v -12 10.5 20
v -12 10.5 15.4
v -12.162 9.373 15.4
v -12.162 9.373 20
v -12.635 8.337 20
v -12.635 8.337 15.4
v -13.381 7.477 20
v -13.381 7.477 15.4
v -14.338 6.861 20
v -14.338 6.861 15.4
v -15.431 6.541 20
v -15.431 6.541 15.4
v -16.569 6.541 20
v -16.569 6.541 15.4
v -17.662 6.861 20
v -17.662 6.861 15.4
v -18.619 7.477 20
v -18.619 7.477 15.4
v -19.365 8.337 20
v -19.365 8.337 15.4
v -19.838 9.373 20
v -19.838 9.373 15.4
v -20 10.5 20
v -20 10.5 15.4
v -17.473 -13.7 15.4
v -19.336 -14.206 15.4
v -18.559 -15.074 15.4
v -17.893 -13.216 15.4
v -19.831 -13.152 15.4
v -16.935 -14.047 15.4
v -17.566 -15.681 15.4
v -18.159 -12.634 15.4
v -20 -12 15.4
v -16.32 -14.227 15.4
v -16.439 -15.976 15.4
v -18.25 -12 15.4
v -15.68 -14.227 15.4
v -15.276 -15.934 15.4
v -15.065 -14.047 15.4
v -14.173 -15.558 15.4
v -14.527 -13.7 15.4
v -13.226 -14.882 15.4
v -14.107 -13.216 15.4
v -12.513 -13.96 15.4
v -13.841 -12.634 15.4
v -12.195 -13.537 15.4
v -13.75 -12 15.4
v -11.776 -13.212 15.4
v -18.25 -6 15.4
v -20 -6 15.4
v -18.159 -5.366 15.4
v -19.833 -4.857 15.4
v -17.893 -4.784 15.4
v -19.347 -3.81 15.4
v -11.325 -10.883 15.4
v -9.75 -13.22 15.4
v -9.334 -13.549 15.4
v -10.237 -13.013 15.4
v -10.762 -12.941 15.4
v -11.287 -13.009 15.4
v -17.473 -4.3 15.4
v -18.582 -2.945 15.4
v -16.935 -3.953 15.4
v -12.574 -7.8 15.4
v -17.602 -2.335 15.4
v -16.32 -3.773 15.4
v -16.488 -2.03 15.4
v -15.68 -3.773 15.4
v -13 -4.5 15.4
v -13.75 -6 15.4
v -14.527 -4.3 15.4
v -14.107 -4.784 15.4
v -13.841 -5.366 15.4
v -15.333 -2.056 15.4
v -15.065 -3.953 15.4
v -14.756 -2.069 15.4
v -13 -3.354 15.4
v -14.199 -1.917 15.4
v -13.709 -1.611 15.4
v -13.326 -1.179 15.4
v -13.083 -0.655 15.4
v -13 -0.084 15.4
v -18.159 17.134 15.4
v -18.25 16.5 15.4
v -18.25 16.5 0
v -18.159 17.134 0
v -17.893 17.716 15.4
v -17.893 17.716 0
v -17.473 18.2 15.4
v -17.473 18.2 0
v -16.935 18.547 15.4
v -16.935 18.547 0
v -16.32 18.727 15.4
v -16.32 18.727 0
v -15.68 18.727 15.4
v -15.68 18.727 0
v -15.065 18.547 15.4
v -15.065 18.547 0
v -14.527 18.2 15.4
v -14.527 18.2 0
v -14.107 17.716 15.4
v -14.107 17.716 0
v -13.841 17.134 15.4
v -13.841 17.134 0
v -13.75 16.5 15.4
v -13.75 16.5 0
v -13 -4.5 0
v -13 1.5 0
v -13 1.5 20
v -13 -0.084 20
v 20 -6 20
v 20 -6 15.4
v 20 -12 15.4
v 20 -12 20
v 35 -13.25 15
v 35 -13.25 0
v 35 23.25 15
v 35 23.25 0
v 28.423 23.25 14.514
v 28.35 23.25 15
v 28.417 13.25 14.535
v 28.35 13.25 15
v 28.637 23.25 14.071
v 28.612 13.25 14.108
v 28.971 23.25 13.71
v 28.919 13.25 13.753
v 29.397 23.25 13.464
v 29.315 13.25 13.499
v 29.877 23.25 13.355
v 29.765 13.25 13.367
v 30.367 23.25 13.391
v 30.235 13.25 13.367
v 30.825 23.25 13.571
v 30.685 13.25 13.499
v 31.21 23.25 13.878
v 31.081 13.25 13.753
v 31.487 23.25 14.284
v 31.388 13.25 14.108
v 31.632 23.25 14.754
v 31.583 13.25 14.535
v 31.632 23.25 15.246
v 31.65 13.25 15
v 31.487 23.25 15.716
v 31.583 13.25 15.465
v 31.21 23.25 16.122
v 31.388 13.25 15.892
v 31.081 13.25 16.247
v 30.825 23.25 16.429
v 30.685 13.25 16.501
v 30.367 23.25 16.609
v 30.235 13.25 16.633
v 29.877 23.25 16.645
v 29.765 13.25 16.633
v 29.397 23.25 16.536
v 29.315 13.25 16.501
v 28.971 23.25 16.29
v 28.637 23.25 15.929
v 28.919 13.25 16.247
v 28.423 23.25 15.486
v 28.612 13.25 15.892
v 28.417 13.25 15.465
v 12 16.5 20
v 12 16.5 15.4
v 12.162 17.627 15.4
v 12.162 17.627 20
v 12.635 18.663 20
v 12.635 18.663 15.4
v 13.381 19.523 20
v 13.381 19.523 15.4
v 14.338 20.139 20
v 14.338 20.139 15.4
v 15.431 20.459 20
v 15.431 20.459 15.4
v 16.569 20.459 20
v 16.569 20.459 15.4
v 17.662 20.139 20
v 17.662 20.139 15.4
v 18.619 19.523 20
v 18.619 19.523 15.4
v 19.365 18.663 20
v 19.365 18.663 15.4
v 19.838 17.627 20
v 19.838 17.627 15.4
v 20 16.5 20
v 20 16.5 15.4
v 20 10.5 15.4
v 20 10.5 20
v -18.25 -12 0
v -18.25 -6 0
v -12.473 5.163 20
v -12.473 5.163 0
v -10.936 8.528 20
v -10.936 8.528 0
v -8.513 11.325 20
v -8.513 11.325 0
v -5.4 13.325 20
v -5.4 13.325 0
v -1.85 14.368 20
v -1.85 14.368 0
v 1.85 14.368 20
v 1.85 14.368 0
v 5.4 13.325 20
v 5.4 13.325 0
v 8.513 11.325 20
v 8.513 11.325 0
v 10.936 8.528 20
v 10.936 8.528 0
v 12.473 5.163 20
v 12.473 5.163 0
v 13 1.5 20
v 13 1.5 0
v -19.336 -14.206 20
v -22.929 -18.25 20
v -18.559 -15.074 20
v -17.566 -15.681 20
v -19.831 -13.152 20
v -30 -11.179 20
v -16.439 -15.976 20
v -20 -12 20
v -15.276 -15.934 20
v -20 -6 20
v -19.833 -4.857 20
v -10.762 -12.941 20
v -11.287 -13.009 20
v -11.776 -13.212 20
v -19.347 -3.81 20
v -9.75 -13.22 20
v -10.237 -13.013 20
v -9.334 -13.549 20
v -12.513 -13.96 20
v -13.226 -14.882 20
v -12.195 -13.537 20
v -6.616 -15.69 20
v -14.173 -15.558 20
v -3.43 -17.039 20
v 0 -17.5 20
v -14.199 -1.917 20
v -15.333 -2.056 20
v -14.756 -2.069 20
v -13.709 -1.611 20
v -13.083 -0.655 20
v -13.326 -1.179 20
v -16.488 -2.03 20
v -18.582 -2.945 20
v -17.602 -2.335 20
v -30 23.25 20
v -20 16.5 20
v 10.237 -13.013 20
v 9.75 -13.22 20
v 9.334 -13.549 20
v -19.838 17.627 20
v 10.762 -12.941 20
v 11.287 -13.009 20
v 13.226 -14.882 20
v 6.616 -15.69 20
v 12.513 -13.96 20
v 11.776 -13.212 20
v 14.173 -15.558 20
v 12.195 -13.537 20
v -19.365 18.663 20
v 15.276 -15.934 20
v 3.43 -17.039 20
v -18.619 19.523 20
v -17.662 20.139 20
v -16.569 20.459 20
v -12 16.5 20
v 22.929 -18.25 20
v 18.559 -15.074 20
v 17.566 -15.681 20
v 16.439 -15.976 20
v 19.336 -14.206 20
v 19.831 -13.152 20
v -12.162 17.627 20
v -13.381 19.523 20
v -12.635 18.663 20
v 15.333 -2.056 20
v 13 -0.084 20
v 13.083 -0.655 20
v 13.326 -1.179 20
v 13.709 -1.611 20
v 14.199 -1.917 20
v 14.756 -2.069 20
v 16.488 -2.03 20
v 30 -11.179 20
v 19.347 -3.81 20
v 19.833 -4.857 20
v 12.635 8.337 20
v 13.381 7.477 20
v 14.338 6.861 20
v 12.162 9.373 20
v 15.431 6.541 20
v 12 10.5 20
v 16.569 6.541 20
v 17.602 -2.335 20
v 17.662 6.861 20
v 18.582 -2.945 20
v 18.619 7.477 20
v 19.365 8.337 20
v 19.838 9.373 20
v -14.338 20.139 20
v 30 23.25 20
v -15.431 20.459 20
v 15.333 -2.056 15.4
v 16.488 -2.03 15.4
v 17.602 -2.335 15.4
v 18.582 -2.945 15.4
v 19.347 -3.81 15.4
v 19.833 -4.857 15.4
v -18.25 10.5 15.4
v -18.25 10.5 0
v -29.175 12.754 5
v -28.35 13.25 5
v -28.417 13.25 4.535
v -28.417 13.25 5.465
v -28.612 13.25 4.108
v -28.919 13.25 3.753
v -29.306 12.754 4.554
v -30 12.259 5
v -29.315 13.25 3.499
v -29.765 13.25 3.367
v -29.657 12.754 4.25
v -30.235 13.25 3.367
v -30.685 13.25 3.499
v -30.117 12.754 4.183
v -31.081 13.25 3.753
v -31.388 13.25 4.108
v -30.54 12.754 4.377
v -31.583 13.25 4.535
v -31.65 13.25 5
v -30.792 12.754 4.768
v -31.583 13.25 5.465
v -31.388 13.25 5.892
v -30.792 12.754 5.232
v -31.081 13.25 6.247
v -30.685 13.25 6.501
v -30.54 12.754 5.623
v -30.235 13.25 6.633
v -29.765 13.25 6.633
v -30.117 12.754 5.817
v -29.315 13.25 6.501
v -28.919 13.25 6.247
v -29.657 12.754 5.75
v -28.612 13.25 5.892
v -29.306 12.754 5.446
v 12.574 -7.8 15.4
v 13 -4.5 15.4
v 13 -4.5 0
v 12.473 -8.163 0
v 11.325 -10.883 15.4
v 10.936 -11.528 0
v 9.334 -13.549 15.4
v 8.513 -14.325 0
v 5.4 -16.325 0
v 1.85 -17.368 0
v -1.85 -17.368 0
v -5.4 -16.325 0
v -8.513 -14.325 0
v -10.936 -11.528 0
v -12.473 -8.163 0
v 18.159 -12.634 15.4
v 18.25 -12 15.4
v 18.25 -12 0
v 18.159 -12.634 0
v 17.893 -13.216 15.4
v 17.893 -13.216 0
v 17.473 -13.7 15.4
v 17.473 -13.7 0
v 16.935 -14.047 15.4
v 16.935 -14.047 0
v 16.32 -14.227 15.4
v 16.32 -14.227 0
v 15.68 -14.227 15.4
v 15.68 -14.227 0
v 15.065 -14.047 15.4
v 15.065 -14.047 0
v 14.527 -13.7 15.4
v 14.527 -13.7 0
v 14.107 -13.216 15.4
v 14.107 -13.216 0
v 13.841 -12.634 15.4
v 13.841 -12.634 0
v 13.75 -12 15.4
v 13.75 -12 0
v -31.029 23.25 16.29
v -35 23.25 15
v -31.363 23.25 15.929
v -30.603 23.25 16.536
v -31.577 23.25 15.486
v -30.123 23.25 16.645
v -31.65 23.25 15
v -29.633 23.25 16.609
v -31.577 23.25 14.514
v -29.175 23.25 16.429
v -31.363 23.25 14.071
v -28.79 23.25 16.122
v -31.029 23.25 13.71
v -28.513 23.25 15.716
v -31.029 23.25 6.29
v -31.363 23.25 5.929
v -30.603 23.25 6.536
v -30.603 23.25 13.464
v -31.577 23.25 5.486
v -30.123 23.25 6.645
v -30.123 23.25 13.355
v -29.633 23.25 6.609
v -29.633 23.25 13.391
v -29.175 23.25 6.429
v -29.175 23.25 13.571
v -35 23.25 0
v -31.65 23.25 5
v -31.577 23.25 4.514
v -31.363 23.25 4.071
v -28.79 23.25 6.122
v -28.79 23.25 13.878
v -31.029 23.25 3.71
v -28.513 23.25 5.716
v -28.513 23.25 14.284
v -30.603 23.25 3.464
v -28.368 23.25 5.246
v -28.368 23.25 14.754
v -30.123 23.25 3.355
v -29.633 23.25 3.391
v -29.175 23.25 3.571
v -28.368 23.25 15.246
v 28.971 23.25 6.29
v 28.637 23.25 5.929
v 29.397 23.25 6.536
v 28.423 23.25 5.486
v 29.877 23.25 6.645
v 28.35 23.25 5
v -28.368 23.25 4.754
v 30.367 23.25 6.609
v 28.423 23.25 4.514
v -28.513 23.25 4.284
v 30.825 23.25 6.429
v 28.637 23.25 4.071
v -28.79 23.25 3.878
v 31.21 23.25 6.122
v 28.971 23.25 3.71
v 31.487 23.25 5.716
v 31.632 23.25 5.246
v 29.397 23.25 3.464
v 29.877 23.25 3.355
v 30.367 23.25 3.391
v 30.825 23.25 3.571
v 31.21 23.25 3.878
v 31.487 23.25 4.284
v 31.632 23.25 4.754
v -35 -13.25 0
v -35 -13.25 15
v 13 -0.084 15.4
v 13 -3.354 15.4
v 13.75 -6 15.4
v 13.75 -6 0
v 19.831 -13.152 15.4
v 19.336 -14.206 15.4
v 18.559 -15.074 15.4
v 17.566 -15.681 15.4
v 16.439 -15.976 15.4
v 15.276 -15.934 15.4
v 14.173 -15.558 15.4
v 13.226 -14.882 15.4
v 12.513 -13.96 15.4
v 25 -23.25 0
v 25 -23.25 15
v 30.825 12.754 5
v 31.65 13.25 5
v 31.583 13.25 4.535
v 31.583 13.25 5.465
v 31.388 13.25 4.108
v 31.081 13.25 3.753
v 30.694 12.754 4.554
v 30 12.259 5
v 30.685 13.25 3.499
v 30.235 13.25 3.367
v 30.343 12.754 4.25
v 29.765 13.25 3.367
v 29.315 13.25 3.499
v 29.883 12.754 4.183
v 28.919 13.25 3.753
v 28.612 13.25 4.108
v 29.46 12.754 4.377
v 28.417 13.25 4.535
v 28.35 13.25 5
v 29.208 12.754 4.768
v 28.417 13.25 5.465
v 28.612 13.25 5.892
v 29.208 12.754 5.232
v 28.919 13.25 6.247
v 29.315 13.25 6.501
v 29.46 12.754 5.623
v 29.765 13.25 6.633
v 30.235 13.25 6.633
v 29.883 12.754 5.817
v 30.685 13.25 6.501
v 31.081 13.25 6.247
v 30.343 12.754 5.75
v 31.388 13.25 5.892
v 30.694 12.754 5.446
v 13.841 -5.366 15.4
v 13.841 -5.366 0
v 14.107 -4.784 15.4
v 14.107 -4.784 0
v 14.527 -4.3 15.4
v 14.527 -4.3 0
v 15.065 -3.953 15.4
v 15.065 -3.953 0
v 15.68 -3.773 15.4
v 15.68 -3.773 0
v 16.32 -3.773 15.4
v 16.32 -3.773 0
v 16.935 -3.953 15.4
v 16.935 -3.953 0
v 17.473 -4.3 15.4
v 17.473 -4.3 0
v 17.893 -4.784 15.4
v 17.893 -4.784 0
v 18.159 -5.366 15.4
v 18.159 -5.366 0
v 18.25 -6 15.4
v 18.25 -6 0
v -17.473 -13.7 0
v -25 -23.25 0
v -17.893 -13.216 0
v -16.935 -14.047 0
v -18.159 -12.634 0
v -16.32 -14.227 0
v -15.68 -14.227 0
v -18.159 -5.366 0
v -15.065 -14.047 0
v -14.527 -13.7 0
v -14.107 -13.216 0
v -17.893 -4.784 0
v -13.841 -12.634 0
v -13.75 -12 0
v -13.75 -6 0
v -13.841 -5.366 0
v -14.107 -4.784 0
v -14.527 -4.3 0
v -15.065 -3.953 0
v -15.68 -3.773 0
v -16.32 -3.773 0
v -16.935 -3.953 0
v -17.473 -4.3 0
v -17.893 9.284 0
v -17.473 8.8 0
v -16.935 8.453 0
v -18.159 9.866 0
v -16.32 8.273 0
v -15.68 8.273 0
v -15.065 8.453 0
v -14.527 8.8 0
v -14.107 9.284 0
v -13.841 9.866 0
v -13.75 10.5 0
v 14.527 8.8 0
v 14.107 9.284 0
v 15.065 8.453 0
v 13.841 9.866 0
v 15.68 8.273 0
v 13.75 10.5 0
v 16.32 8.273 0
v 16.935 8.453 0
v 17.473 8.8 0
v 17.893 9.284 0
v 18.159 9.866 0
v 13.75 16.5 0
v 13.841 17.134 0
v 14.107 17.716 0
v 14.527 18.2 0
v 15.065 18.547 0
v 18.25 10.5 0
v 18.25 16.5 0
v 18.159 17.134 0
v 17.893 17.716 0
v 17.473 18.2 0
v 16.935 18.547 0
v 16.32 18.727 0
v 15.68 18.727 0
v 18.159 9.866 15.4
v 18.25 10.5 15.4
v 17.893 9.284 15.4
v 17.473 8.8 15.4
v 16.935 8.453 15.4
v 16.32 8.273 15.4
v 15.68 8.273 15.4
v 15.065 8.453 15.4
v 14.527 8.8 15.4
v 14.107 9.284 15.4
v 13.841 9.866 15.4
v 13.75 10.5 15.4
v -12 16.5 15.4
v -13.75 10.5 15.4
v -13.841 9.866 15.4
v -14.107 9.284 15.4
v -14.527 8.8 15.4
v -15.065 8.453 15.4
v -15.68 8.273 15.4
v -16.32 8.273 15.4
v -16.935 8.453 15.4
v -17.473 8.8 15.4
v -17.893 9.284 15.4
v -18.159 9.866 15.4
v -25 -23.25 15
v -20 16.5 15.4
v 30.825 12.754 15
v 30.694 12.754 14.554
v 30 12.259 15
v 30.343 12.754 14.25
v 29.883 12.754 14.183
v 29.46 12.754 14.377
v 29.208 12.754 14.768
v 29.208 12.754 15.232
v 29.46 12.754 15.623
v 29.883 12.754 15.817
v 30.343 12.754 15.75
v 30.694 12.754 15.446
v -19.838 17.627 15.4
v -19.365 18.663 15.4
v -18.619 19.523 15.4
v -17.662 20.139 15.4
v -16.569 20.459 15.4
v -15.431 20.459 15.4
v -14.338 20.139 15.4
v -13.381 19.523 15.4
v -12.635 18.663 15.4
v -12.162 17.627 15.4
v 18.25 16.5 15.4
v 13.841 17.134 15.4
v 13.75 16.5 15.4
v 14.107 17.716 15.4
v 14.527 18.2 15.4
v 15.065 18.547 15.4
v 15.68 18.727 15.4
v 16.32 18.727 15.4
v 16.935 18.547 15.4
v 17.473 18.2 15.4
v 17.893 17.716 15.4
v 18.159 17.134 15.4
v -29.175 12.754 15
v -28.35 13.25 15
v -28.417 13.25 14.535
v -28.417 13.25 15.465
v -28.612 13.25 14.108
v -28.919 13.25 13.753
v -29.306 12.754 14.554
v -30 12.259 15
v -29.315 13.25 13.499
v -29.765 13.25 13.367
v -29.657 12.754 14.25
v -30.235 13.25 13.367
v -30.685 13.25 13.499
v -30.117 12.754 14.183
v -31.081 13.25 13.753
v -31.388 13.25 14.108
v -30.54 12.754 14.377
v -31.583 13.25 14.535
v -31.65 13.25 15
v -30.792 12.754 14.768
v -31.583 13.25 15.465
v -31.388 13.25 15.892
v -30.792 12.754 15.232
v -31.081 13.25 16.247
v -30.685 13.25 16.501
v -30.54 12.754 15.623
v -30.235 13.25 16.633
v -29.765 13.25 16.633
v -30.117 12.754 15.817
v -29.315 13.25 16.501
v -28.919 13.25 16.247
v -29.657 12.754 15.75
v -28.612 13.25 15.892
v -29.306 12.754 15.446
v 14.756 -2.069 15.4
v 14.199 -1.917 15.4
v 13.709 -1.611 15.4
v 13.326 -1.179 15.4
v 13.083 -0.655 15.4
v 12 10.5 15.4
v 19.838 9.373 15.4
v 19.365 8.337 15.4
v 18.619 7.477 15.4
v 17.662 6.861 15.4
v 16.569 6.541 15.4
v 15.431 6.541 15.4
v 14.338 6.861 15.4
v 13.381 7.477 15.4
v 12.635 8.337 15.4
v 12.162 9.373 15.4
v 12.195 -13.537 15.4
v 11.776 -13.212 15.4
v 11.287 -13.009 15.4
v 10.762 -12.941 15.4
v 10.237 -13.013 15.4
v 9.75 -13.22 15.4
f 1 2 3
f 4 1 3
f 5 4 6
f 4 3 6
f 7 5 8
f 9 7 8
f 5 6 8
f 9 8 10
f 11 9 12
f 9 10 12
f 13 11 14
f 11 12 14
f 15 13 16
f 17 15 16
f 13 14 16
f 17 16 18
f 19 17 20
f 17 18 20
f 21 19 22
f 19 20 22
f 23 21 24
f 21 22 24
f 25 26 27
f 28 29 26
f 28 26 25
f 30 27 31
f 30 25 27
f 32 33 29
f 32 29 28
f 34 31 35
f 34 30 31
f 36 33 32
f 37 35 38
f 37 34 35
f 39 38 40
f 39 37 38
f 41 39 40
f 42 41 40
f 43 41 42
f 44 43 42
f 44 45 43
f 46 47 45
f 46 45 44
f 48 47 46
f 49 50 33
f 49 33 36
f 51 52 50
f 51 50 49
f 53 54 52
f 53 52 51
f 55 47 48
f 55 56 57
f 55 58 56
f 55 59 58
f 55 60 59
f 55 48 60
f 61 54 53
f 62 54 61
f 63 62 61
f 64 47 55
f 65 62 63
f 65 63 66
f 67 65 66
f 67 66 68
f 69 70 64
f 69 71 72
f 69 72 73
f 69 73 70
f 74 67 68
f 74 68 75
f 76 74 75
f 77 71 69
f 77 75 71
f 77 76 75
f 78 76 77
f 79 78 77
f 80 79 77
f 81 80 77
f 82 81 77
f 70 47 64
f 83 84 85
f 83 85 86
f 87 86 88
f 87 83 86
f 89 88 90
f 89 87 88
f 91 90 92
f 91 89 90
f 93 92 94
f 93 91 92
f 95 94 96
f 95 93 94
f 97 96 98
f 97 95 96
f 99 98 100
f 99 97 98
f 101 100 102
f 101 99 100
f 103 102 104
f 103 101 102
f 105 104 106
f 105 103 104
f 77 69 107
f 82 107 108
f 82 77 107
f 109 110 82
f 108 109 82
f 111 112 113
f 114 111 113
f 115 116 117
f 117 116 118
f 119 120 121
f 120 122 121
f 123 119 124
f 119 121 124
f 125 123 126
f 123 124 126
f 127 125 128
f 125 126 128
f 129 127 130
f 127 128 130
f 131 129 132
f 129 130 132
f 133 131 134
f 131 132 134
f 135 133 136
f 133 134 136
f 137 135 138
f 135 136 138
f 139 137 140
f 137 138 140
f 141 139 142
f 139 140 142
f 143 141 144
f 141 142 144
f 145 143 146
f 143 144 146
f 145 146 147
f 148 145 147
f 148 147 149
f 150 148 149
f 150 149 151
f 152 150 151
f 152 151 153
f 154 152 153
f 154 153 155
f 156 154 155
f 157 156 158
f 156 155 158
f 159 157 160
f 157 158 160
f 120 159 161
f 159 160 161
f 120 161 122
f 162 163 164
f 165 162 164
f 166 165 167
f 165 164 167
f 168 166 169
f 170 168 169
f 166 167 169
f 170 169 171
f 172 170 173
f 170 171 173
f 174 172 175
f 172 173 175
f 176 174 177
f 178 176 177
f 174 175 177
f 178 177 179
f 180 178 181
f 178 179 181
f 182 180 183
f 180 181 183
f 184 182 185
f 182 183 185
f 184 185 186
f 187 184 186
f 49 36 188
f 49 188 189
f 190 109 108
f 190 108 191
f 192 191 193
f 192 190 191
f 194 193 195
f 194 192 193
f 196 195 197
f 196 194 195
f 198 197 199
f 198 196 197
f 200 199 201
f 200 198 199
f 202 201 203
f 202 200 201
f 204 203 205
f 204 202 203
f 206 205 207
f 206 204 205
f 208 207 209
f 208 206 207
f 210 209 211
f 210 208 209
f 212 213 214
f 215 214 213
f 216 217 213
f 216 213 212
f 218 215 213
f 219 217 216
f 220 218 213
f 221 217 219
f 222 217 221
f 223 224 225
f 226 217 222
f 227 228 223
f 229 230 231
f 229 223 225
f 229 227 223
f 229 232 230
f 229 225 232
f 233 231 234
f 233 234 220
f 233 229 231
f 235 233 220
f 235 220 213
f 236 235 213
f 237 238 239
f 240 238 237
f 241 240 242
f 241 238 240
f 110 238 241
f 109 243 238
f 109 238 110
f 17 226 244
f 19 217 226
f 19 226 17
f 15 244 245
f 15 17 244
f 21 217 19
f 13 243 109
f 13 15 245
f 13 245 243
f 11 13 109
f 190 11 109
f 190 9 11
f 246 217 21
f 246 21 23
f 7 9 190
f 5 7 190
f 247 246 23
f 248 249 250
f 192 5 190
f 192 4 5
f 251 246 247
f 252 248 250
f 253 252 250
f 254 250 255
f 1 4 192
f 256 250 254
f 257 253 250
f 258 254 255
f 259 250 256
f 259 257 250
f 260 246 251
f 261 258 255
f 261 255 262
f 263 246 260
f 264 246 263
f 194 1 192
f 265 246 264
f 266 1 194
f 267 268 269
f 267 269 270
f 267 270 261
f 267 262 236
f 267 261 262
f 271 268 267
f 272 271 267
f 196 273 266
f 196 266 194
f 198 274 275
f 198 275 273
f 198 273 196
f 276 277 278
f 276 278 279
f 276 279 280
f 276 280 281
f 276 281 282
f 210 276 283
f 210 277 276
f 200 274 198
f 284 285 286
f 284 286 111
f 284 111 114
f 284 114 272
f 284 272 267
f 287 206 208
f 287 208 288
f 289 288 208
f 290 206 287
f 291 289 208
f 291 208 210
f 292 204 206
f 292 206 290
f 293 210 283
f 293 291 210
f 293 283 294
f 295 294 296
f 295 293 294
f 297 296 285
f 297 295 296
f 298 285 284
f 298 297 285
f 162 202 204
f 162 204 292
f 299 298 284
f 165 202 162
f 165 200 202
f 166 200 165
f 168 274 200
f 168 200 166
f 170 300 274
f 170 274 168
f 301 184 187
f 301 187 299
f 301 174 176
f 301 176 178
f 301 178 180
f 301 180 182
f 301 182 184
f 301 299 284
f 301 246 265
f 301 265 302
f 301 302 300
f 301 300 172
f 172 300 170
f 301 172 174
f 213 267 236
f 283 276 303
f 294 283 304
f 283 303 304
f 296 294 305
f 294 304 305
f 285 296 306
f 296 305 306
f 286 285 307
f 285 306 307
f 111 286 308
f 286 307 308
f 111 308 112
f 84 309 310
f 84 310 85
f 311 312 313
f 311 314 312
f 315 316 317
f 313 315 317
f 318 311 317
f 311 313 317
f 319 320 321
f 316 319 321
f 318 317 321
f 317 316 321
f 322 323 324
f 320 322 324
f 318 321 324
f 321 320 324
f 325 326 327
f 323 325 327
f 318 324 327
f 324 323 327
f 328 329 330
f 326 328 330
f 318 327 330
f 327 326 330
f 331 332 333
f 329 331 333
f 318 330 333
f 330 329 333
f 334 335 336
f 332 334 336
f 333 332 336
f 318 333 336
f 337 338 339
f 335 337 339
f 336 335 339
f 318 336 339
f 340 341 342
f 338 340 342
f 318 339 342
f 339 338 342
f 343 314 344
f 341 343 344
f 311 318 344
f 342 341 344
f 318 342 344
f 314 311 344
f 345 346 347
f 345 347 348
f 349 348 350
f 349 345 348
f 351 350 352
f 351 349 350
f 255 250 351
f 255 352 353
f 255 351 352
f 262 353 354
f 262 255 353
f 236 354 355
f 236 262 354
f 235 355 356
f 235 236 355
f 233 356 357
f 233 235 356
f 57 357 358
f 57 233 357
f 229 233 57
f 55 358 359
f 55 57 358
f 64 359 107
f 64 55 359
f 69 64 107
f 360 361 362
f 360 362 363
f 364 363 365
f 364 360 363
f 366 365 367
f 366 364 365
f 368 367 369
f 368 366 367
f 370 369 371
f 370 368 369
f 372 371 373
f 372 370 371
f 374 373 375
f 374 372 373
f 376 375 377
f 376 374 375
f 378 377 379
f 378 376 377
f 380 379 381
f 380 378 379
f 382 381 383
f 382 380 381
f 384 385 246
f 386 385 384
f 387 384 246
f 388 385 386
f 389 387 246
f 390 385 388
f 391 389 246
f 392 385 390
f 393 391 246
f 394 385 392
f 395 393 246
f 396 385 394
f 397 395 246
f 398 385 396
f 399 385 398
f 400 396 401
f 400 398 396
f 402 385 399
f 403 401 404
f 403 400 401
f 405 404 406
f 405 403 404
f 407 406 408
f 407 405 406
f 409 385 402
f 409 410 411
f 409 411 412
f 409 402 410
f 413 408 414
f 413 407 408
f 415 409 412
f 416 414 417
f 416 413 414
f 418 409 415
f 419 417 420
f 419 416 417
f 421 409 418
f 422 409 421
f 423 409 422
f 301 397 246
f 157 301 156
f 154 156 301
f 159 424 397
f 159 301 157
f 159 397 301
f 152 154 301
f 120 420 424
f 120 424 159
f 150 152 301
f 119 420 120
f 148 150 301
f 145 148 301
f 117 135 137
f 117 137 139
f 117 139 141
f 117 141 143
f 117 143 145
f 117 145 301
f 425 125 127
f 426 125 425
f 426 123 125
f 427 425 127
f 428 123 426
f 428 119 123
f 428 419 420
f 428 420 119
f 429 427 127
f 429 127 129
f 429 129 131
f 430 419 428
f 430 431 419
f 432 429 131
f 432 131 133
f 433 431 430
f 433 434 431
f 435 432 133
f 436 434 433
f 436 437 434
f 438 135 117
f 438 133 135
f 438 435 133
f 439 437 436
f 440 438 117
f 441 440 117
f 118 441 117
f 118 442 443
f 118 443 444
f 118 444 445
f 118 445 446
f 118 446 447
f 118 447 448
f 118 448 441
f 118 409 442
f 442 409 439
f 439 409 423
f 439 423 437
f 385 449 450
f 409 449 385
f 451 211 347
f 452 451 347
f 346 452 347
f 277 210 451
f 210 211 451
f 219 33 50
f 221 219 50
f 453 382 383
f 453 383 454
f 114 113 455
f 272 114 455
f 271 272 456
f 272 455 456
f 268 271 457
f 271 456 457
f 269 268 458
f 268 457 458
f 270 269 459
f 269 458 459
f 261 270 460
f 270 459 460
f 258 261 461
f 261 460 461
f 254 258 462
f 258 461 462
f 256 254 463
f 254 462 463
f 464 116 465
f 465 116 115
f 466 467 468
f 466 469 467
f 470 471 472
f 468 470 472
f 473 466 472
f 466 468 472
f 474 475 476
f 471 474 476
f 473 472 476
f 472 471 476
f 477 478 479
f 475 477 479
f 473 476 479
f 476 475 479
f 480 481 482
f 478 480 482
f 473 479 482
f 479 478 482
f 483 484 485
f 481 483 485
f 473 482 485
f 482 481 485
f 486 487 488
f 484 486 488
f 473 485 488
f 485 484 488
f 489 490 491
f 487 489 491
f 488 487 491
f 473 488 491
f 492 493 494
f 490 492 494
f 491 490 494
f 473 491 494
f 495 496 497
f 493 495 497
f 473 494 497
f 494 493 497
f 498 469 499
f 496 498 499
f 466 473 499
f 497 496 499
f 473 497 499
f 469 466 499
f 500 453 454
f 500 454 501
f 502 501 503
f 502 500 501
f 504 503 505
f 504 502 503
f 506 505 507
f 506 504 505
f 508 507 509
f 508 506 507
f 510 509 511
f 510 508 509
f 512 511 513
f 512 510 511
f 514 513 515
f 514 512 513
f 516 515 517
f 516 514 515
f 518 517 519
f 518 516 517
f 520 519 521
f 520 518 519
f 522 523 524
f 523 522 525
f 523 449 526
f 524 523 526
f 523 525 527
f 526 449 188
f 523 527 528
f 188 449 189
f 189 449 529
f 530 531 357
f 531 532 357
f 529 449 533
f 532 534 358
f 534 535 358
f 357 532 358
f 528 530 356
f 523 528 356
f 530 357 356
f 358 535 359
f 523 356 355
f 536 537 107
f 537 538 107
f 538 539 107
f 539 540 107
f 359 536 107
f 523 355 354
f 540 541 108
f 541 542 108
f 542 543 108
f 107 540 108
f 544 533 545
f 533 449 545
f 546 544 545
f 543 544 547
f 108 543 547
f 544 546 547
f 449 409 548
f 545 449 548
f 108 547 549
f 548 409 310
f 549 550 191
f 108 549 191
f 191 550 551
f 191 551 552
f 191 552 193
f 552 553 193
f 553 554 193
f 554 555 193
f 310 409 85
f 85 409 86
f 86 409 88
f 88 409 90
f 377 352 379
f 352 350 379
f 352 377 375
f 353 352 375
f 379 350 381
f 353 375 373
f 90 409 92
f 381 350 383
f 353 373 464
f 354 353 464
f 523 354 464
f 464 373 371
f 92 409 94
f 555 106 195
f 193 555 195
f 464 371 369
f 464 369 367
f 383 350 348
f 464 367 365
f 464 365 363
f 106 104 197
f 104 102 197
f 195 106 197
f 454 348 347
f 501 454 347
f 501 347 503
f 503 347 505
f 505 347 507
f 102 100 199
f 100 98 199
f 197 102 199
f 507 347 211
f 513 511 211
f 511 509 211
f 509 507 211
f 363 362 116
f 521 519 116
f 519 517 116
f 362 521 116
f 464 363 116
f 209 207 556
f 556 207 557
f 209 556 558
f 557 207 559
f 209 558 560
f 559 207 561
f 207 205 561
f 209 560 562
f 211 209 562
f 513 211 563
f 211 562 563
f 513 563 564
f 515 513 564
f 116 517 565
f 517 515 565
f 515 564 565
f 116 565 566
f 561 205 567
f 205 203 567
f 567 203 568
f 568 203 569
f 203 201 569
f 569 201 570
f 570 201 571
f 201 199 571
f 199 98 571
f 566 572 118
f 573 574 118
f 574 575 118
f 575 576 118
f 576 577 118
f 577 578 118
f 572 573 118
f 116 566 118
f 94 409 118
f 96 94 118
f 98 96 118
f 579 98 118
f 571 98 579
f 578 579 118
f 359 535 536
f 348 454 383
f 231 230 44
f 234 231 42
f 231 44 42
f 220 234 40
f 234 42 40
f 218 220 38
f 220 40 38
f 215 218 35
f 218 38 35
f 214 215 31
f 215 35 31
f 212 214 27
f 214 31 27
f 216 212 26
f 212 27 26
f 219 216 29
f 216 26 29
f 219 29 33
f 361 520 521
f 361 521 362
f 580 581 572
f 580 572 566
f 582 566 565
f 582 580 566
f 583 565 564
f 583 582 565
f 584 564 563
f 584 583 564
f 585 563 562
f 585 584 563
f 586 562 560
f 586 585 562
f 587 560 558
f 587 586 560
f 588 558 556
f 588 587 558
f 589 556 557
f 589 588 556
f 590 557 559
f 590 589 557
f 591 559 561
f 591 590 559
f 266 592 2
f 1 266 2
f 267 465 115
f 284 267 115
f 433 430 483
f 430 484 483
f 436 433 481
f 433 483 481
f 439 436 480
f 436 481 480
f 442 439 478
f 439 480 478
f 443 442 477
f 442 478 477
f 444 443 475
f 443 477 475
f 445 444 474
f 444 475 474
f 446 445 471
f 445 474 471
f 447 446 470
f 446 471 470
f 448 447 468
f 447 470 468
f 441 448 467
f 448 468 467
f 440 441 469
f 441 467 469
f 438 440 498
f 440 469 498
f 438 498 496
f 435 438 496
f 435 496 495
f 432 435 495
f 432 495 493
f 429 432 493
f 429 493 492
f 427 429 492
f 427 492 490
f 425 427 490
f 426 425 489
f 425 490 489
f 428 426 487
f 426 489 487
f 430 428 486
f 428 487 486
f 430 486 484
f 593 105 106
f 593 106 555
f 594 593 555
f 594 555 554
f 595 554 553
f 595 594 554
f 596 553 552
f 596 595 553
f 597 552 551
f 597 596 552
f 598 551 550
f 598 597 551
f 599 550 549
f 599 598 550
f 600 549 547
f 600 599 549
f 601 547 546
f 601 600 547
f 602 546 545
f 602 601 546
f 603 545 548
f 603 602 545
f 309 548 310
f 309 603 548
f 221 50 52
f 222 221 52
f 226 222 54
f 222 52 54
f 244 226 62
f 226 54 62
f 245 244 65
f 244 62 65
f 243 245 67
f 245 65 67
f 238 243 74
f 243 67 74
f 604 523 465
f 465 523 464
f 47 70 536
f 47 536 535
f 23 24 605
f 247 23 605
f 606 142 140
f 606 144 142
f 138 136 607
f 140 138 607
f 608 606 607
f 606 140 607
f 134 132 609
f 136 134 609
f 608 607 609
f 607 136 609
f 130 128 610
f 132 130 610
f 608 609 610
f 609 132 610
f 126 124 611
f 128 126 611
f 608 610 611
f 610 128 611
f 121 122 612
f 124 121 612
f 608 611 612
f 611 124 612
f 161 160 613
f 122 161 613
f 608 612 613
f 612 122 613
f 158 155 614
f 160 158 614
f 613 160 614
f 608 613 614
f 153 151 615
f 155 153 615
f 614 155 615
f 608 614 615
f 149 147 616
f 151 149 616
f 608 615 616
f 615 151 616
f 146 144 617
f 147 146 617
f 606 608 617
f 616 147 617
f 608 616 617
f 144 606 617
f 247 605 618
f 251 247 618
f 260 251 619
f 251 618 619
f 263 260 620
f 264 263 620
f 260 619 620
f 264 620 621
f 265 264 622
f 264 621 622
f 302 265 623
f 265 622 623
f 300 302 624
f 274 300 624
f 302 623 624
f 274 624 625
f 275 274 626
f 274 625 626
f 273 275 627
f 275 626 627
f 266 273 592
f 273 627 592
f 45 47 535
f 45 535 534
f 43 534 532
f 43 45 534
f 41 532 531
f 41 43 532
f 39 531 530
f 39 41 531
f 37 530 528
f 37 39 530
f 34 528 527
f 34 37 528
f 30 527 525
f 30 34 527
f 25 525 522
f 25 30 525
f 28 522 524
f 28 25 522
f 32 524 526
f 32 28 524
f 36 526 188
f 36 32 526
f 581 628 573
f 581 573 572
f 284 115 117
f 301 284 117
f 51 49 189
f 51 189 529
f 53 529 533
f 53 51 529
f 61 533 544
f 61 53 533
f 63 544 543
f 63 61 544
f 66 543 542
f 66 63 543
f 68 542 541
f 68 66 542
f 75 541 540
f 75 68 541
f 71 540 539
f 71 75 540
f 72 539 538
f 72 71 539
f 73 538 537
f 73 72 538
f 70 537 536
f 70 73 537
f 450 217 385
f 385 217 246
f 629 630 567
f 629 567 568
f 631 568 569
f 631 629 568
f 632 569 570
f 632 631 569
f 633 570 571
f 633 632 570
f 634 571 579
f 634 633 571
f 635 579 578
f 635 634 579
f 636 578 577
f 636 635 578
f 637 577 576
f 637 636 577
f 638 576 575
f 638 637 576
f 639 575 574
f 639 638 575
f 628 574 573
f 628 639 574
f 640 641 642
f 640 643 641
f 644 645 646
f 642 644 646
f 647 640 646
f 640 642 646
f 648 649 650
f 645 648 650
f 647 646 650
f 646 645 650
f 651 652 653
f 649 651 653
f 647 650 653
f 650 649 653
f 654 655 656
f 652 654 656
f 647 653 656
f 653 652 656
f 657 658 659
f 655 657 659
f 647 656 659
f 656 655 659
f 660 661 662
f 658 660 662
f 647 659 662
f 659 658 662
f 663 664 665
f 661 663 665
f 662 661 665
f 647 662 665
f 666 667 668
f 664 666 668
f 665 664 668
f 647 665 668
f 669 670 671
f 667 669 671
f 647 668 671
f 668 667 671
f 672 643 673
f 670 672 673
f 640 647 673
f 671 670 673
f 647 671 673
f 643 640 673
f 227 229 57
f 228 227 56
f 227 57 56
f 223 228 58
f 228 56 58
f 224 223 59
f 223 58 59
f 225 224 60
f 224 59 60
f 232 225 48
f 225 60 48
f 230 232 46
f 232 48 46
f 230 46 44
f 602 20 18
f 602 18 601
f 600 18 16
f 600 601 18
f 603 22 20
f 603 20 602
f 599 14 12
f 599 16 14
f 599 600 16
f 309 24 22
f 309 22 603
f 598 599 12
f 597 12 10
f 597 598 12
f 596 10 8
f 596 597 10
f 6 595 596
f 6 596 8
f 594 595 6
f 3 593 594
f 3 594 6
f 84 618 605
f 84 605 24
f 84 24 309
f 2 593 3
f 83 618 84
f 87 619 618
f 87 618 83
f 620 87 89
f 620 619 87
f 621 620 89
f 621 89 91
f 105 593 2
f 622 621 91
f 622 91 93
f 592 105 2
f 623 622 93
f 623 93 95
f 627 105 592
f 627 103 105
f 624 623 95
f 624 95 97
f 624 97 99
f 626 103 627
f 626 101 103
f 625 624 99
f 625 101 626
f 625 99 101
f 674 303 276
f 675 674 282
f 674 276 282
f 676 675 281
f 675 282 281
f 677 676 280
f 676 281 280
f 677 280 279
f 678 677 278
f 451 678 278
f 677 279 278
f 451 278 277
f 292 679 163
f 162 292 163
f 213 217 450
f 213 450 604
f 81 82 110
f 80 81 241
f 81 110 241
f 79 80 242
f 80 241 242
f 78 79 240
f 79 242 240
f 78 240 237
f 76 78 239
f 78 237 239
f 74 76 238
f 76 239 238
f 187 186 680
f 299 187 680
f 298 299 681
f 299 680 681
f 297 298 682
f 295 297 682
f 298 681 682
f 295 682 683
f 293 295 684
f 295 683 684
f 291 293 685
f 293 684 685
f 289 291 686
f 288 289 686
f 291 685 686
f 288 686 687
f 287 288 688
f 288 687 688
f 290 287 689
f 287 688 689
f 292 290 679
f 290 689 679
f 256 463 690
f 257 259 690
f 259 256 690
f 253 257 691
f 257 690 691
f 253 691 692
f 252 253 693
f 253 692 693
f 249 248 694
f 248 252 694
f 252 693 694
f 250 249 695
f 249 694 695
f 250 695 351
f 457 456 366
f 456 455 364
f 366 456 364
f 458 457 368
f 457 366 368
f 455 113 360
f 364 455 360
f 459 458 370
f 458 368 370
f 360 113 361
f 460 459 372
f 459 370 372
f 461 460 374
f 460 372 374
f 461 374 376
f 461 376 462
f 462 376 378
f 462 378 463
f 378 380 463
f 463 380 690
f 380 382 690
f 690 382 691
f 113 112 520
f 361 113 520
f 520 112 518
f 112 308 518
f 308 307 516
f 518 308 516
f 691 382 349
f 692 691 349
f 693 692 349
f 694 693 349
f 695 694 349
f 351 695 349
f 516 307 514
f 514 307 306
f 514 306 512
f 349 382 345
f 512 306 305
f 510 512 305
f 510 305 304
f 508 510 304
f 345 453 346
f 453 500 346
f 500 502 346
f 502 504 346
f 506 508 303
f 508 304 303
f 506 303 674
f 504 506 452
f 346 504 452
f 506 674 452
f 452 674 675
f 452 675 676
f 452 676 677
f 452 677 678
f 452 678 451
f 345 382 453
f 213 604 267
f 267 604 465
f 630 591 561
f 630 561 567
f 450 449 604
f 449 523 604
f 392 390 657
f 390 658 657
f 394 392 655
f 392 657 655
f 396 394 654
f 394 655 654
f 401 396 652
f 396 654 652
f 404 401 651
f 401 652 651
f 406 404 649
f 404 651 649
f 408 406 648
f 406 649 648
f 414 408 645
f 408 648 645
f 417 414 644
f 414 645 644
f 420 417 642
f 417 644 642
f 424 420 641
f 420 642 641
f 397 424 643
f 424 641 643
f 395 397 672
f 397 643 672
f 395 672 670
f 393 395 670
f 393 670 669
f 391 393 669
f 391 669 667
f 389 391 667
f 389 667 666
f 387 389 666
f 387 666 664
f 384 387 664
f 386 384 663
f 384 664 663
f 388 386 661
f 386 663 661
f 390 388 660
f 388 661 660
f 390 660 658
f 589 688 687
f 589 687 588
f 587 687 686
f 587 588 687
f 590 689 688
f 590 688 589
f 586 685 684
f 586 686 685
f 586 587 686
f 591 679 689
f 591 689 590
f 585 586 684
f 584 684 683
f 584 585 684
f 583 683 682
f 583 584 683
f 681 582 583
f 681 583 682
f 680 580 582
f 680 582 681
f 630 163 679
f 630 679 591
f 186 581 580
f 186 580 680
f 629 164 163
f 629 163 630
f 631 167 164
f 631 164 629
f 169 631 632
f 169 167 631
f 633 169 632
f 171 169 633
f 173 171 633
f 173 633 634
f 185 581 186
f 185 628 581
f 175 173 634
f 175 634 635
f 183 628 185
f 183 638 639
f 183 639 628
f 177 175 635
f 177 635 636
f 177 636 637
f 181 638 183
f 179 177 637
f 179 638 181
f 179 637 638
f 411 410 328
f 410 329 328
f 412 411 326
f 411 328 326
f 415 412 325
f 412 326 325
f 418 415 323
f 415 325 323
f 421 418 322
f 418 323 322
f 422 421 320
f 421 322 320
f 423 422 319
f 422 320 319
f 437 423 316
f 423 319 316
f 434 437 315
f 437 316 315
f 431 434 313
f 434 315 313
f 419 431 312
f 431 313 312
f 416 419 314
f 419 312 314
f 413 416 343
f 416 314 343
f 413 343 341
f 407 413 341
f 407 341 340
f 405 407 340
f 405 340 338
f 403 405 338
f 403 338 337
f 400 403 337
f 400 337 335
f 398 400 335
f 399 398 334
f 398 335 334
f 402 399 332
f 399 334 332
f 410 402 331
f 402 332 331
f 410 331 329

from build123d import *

# Parameters (mm, degrees)
SKETCH1_W                                            = 70
SKETCH1_H                                            = 46.5
BOSS_EXTRUDE1_DEPTH                                  = 20
CUT_EXTRUDE1_DEPTH                                   = 47.535604648
CBORE_FOR_M4_HEXAGON_SOCKET_HEAD_CAP_SCR_D           = 4.5
CBORE_FOR_M4_HEXAGON_SOCKET_HEAD_CAP_SCR_CBORE_D     = 8
CBORE_FOR_M4_HEXAGON_SOCKET_HEAD_CAP_SCR_CBORE_DEPTH = 4.6
CUT_EXTRUDE2_DEPTH                                   = 45.751787674
CUT_EXTRUDE3_DEPTH                                   = 45.751787674
FILLET1_R                                            = 2
CHAMFER1_SIZE                                        = 10
M4_TAPPED_HOLE1_D                                    = 3.3
M4_TAPPED_HOLE1_DEPTH                                = 10
M4_TAPPED_HOLE1_TIP                                  = 0.991420021
CHAMFER2_SIZE                                        = 5


with BuildPart() as part:
    # Sketch1 → Boss-Extrude1 (new body)
    with BuildSketch(Plane.XY):
        Rectangle(SKETCH1_W, SKETCH1_H)
    extrude(amount=BOSS_EXTRUDE1_DEPTH)

    # Sketch2 → Cut-Extrude1 (cut, through all)
    with BuildSketch(Plane.XY.offset(20)):
        with BuildLine():
            Line((-13, -4.5), (-13, 1.5))
            ThreePointArc((-13, 1.5), (0, 14.5), (13, 1.5))
            Line((13, 1.5), (13, -4.5))
            ThreePointArc((13, -4.5), (0, -17.5), (-13, -4.5))
        make_face()
    extrude(amount=-CUT_EXTRUDE1_DEPTH, mode=Mode.SUBTRACT)

    # CBORE for M4 Hexagon socket head cap screws1 (through all)
    with Locations(Plane.XY.offset(20)):
        with Locations((-16, 13.5), (-16, -9), (16, -9), (16, 13.5), (0, -1.5)):
            CounterBoreHole(CBORE_FOR_M4_HEXAGON_SOCKET_HEAD_CAP_SCR_D / 2, CBORE_FOR_M4_HEXAGON_SOCKET_HEAD_CAP_SCR_CBORE_D / 2, CBORE_FOR_M4_HEXAGON_SOCKET_HEAD_CAP_SCR_CBORE_DEPTH)

    # Sketch6 → Cut-Extrude2 (cut, through all)
    with BuildSketch(Plane.XY.offset(15.4)):
        with BuildLine():
            Line((-12, 16.5), (-12, 10.5))
            ThreePointArc((-12, 10.5), (-16, 6.5), (-20, 10.5))
            Line((-20, 10.5), (-20, 16.5))
            ThreePointArc((-20, 16.5), (-16, 20.5), (-12, 16.5))
        make_face()
        with BuildLine():
            Line((-12, -6), (-12, -12))
            ThreePointArc((-12, -12), (-16, -16), (-20, -12))
            Line((-20, -12), (-20, -6))
            ThreePointArc((-20, -6), (-16, -2), (-12, -6))
        make_face()
        with BuildLine():
            Line((20, 16.5), (20, 10.5))
            ThreePointArc((20, 10.5), (16, 6.5), (12, 10.5))
            Line((12, 10.5), (12, 16.5))
            ThreePointArc((12, 16.5), (16, 20.5), (20, 16.5))
        make_face()
        with BuildLine():
            Line((12, -12), (12, -6))
            ThreePointArc((12, -6), (16, -2), (20, -6))
            Line((20, -6), (20, -12))
            ThreePointArc((20, -12), (16, -16), (12, -12))
        make_face()
    extrude(amount=CUT_EXTRUDE2_DEPTH, mode=Mode.SUBTRACT)

    # Sketch7 → Cut-Extrude3 (cut, through all)
    with BuildSketch(Plane.XY.offset(15.4)):
        with BuildLine():
            Line((-13.75, 16.5), (-13.75, 10.5))
            ThreePointArc((-13.75, 10.5), (-16, 8.25), (-18.25, 10.5))
            Line((-18.25, 10.5), (-18.25, 16.5))
            ThreePointArc((-18.25, 16.5), (-16, 18.75), (-13.75, 16.5))
        make_face()
        with BuildLine():
            Line((-18.25, -12), (-18.25, -6))
            ThreePointArc((-18.25, -6), (-16, -3.75), (-13.75, -6))
            Line((-13.75, -6), (-13.75, -12))
            ThreePointArc((-13.75, -12), (-16, -14.25), (-18.25, -12))
        make_face()
        with BuildLine():
            Line((18.25, 16.5), (18.25, 10.5))
            ThreePointArc((18.25, 10.5), (16, 8.25), (13.75, 10.5))
            Line((13.75, 10.5), (13.75, 16.5))
            ThreePointArc((13.75, 16.5), (16, 18.75), (18.25, 16.5))
        make_face()
        with BuildLine():
            Line((18.25, -6), (18.25, -12))
            ThreePointArc((18.25, -12), (16, -14.25), (13.75, -12))
            Line((13.75, -12), (13.75, -6))
            ThreePointArc((13.75, -6), (16, -3.75), (18.25, -6))
        make_face()
    extrude(amount=-CUT_EXTRUDE3_DEPTH, mode=Mode.SUBTRACT)

    # Fillet1
    # the kernel refuses this fillet: 2 mm, written as the material it takes off along each edge
    with BuildSketch(Plane(origin=(13, -3.354248689, 28.17582118), x_dir=(0.8738382268582209, 0.48621677601794083, 0), z_dir=(0, 0, -1))) as fillet1_piece_1:
        with BuildLine():
            CenterArc((3.33776502, -1.885304481), FILLET1_R, 109.498154832, 99.594068227)
            Line((1.590088566, -2.857738033), (0, 0))
            ThreePointArc((0, 0), (1.335106008, -0.229391038), (2.670212016, 0))
        make_face()
    extrude(amount=12.77582118, mode=Mode.SUBTRACT)
    with BuildSketch(Plane(origin=(12, -9.5, 15.4), x_dir=(0.11433437649297556, -0.993442323616204, 0), z_dir=(0, 0, 1))) as fillet1_piece_2:
        with BuildLine():
            CenterArc((5.264320611, -1.843966677), FILLET1_R, 112.782223337, 106.542245194)
            Line((3.717181311, -3.111389253), (3.562467381, -3.238131511))
            ThreePointArc((3.562467381, -3.238131511), (1.876525646, -1.534267667), (-0.097526525, -0.174609785))
            Line((-0.097526525, -0.174609785), (0.022866875, 0.198688465))
            ThreePointArc((0.022866875, 0.198688465), (2.506472684, -0.087147477), (4.412415603, 0.184396668))
            Line((4.412415603, 0.184396668), (4.489861512, 0))
        make_face()
    extrude(amount=16.718730334, mode=Mode.SUBTRACT)
    with BuildSketch(Plane(origin=(-12, -9.5, 15.4), x_dir=(0.549971838681665, -0.8351831994581241, 0), z_dir=(0, 0, 1))) as fillet1_piece_3:
        with BuildLine():
            CenterArc((5.220376144, -1.964931936), FILLET1_R, 100.745216059, 106.542245194)
            Line((3.442940977, -2.881842089), (3.265197461, -2.973533104))
            ThreePointArc((3.265197461, -2.973533104), (1.977963631, -1.541966237), (-0.109994368, -0.16703664))
            Line((-0.109994368, -0.16703664), (0.037288401, 0.196493194))
            ThreePointArc((0.037288401, 0.196493194), (2.423746067, -0.027942413), (4.810203733, 0.196493194))
            Line((4.810203733, 0.196493194), (4.847492134, 0))
        make_face()
    extrude(amount=16.718730334, mode=Mode.SUBTRACT)
    with BuildSketch(Plane(origin=(-13, -3.354248689, 28.17582118), x_dir=(-0.8738382268582207, 0.48621677601794133, 0), z_dir=(0, 0, -1))) as fillet1_piece_4:
        with BuildLine():
            CenterArc((3.33776502, 1.885304481), FILLET1_R, 150.907776941, 99.594068227)
            Line((1.590088566, 2.857738033), (0, 0))
            ThreePointArc((0, 0), (1.335106008, 0.229391038), (2.670212016, 0))
        make_face()
    extrude(amount=12.77582118, mode=Mode.SUBTRACT)

    # Chamfer1
    chamfer1_edges = [part.edges().sort_by_distance(p)[0] for p in [
        (35, -23.25, 10),
        (-35, -23.25, 10),
    ]]
    chamfer(chamfer1_edges, length=CHAMFER1_SIZE)

    # M4 Tapped Hole1
    with Locations(Plane(origin=(0, 23.25, 0), x_dir=(1, 0, 0), z_dir=(0, 1, 0))):
        with Locations((-30, -15), (-30, -5), (30, -5), (30, -15)):
            Hole(M4_TAPPED_HOLE1_D / 2, depth=M4_TAPPED_HOLE1_DEPTH)
            with Locations((0, 0, -(M4_TAPPED_HOLE1_DEPTH + M4_TAPPED_HOLE1_TIP / 2))):  # 118° drill point
                Cone(0, M4_TAPPED_HOLE1_D / 2, M4_TAPPED_HOLE1_TIP, mode=Mode.SUBTRACT)

    # Chamfer2
    chamfer2_edges = [part.edges().sort_by_distance(p)[0] for p in [
        (35, 5, 20),
        (0, -23.25, 20),
        (-30, -18.25, 20),
        (30, -18.25, 20),
        (-35, 5, 20),
    ]]
    chamfer(chamfer2_edges, length=CHAMFER2_SIZE)


solid = part.part
